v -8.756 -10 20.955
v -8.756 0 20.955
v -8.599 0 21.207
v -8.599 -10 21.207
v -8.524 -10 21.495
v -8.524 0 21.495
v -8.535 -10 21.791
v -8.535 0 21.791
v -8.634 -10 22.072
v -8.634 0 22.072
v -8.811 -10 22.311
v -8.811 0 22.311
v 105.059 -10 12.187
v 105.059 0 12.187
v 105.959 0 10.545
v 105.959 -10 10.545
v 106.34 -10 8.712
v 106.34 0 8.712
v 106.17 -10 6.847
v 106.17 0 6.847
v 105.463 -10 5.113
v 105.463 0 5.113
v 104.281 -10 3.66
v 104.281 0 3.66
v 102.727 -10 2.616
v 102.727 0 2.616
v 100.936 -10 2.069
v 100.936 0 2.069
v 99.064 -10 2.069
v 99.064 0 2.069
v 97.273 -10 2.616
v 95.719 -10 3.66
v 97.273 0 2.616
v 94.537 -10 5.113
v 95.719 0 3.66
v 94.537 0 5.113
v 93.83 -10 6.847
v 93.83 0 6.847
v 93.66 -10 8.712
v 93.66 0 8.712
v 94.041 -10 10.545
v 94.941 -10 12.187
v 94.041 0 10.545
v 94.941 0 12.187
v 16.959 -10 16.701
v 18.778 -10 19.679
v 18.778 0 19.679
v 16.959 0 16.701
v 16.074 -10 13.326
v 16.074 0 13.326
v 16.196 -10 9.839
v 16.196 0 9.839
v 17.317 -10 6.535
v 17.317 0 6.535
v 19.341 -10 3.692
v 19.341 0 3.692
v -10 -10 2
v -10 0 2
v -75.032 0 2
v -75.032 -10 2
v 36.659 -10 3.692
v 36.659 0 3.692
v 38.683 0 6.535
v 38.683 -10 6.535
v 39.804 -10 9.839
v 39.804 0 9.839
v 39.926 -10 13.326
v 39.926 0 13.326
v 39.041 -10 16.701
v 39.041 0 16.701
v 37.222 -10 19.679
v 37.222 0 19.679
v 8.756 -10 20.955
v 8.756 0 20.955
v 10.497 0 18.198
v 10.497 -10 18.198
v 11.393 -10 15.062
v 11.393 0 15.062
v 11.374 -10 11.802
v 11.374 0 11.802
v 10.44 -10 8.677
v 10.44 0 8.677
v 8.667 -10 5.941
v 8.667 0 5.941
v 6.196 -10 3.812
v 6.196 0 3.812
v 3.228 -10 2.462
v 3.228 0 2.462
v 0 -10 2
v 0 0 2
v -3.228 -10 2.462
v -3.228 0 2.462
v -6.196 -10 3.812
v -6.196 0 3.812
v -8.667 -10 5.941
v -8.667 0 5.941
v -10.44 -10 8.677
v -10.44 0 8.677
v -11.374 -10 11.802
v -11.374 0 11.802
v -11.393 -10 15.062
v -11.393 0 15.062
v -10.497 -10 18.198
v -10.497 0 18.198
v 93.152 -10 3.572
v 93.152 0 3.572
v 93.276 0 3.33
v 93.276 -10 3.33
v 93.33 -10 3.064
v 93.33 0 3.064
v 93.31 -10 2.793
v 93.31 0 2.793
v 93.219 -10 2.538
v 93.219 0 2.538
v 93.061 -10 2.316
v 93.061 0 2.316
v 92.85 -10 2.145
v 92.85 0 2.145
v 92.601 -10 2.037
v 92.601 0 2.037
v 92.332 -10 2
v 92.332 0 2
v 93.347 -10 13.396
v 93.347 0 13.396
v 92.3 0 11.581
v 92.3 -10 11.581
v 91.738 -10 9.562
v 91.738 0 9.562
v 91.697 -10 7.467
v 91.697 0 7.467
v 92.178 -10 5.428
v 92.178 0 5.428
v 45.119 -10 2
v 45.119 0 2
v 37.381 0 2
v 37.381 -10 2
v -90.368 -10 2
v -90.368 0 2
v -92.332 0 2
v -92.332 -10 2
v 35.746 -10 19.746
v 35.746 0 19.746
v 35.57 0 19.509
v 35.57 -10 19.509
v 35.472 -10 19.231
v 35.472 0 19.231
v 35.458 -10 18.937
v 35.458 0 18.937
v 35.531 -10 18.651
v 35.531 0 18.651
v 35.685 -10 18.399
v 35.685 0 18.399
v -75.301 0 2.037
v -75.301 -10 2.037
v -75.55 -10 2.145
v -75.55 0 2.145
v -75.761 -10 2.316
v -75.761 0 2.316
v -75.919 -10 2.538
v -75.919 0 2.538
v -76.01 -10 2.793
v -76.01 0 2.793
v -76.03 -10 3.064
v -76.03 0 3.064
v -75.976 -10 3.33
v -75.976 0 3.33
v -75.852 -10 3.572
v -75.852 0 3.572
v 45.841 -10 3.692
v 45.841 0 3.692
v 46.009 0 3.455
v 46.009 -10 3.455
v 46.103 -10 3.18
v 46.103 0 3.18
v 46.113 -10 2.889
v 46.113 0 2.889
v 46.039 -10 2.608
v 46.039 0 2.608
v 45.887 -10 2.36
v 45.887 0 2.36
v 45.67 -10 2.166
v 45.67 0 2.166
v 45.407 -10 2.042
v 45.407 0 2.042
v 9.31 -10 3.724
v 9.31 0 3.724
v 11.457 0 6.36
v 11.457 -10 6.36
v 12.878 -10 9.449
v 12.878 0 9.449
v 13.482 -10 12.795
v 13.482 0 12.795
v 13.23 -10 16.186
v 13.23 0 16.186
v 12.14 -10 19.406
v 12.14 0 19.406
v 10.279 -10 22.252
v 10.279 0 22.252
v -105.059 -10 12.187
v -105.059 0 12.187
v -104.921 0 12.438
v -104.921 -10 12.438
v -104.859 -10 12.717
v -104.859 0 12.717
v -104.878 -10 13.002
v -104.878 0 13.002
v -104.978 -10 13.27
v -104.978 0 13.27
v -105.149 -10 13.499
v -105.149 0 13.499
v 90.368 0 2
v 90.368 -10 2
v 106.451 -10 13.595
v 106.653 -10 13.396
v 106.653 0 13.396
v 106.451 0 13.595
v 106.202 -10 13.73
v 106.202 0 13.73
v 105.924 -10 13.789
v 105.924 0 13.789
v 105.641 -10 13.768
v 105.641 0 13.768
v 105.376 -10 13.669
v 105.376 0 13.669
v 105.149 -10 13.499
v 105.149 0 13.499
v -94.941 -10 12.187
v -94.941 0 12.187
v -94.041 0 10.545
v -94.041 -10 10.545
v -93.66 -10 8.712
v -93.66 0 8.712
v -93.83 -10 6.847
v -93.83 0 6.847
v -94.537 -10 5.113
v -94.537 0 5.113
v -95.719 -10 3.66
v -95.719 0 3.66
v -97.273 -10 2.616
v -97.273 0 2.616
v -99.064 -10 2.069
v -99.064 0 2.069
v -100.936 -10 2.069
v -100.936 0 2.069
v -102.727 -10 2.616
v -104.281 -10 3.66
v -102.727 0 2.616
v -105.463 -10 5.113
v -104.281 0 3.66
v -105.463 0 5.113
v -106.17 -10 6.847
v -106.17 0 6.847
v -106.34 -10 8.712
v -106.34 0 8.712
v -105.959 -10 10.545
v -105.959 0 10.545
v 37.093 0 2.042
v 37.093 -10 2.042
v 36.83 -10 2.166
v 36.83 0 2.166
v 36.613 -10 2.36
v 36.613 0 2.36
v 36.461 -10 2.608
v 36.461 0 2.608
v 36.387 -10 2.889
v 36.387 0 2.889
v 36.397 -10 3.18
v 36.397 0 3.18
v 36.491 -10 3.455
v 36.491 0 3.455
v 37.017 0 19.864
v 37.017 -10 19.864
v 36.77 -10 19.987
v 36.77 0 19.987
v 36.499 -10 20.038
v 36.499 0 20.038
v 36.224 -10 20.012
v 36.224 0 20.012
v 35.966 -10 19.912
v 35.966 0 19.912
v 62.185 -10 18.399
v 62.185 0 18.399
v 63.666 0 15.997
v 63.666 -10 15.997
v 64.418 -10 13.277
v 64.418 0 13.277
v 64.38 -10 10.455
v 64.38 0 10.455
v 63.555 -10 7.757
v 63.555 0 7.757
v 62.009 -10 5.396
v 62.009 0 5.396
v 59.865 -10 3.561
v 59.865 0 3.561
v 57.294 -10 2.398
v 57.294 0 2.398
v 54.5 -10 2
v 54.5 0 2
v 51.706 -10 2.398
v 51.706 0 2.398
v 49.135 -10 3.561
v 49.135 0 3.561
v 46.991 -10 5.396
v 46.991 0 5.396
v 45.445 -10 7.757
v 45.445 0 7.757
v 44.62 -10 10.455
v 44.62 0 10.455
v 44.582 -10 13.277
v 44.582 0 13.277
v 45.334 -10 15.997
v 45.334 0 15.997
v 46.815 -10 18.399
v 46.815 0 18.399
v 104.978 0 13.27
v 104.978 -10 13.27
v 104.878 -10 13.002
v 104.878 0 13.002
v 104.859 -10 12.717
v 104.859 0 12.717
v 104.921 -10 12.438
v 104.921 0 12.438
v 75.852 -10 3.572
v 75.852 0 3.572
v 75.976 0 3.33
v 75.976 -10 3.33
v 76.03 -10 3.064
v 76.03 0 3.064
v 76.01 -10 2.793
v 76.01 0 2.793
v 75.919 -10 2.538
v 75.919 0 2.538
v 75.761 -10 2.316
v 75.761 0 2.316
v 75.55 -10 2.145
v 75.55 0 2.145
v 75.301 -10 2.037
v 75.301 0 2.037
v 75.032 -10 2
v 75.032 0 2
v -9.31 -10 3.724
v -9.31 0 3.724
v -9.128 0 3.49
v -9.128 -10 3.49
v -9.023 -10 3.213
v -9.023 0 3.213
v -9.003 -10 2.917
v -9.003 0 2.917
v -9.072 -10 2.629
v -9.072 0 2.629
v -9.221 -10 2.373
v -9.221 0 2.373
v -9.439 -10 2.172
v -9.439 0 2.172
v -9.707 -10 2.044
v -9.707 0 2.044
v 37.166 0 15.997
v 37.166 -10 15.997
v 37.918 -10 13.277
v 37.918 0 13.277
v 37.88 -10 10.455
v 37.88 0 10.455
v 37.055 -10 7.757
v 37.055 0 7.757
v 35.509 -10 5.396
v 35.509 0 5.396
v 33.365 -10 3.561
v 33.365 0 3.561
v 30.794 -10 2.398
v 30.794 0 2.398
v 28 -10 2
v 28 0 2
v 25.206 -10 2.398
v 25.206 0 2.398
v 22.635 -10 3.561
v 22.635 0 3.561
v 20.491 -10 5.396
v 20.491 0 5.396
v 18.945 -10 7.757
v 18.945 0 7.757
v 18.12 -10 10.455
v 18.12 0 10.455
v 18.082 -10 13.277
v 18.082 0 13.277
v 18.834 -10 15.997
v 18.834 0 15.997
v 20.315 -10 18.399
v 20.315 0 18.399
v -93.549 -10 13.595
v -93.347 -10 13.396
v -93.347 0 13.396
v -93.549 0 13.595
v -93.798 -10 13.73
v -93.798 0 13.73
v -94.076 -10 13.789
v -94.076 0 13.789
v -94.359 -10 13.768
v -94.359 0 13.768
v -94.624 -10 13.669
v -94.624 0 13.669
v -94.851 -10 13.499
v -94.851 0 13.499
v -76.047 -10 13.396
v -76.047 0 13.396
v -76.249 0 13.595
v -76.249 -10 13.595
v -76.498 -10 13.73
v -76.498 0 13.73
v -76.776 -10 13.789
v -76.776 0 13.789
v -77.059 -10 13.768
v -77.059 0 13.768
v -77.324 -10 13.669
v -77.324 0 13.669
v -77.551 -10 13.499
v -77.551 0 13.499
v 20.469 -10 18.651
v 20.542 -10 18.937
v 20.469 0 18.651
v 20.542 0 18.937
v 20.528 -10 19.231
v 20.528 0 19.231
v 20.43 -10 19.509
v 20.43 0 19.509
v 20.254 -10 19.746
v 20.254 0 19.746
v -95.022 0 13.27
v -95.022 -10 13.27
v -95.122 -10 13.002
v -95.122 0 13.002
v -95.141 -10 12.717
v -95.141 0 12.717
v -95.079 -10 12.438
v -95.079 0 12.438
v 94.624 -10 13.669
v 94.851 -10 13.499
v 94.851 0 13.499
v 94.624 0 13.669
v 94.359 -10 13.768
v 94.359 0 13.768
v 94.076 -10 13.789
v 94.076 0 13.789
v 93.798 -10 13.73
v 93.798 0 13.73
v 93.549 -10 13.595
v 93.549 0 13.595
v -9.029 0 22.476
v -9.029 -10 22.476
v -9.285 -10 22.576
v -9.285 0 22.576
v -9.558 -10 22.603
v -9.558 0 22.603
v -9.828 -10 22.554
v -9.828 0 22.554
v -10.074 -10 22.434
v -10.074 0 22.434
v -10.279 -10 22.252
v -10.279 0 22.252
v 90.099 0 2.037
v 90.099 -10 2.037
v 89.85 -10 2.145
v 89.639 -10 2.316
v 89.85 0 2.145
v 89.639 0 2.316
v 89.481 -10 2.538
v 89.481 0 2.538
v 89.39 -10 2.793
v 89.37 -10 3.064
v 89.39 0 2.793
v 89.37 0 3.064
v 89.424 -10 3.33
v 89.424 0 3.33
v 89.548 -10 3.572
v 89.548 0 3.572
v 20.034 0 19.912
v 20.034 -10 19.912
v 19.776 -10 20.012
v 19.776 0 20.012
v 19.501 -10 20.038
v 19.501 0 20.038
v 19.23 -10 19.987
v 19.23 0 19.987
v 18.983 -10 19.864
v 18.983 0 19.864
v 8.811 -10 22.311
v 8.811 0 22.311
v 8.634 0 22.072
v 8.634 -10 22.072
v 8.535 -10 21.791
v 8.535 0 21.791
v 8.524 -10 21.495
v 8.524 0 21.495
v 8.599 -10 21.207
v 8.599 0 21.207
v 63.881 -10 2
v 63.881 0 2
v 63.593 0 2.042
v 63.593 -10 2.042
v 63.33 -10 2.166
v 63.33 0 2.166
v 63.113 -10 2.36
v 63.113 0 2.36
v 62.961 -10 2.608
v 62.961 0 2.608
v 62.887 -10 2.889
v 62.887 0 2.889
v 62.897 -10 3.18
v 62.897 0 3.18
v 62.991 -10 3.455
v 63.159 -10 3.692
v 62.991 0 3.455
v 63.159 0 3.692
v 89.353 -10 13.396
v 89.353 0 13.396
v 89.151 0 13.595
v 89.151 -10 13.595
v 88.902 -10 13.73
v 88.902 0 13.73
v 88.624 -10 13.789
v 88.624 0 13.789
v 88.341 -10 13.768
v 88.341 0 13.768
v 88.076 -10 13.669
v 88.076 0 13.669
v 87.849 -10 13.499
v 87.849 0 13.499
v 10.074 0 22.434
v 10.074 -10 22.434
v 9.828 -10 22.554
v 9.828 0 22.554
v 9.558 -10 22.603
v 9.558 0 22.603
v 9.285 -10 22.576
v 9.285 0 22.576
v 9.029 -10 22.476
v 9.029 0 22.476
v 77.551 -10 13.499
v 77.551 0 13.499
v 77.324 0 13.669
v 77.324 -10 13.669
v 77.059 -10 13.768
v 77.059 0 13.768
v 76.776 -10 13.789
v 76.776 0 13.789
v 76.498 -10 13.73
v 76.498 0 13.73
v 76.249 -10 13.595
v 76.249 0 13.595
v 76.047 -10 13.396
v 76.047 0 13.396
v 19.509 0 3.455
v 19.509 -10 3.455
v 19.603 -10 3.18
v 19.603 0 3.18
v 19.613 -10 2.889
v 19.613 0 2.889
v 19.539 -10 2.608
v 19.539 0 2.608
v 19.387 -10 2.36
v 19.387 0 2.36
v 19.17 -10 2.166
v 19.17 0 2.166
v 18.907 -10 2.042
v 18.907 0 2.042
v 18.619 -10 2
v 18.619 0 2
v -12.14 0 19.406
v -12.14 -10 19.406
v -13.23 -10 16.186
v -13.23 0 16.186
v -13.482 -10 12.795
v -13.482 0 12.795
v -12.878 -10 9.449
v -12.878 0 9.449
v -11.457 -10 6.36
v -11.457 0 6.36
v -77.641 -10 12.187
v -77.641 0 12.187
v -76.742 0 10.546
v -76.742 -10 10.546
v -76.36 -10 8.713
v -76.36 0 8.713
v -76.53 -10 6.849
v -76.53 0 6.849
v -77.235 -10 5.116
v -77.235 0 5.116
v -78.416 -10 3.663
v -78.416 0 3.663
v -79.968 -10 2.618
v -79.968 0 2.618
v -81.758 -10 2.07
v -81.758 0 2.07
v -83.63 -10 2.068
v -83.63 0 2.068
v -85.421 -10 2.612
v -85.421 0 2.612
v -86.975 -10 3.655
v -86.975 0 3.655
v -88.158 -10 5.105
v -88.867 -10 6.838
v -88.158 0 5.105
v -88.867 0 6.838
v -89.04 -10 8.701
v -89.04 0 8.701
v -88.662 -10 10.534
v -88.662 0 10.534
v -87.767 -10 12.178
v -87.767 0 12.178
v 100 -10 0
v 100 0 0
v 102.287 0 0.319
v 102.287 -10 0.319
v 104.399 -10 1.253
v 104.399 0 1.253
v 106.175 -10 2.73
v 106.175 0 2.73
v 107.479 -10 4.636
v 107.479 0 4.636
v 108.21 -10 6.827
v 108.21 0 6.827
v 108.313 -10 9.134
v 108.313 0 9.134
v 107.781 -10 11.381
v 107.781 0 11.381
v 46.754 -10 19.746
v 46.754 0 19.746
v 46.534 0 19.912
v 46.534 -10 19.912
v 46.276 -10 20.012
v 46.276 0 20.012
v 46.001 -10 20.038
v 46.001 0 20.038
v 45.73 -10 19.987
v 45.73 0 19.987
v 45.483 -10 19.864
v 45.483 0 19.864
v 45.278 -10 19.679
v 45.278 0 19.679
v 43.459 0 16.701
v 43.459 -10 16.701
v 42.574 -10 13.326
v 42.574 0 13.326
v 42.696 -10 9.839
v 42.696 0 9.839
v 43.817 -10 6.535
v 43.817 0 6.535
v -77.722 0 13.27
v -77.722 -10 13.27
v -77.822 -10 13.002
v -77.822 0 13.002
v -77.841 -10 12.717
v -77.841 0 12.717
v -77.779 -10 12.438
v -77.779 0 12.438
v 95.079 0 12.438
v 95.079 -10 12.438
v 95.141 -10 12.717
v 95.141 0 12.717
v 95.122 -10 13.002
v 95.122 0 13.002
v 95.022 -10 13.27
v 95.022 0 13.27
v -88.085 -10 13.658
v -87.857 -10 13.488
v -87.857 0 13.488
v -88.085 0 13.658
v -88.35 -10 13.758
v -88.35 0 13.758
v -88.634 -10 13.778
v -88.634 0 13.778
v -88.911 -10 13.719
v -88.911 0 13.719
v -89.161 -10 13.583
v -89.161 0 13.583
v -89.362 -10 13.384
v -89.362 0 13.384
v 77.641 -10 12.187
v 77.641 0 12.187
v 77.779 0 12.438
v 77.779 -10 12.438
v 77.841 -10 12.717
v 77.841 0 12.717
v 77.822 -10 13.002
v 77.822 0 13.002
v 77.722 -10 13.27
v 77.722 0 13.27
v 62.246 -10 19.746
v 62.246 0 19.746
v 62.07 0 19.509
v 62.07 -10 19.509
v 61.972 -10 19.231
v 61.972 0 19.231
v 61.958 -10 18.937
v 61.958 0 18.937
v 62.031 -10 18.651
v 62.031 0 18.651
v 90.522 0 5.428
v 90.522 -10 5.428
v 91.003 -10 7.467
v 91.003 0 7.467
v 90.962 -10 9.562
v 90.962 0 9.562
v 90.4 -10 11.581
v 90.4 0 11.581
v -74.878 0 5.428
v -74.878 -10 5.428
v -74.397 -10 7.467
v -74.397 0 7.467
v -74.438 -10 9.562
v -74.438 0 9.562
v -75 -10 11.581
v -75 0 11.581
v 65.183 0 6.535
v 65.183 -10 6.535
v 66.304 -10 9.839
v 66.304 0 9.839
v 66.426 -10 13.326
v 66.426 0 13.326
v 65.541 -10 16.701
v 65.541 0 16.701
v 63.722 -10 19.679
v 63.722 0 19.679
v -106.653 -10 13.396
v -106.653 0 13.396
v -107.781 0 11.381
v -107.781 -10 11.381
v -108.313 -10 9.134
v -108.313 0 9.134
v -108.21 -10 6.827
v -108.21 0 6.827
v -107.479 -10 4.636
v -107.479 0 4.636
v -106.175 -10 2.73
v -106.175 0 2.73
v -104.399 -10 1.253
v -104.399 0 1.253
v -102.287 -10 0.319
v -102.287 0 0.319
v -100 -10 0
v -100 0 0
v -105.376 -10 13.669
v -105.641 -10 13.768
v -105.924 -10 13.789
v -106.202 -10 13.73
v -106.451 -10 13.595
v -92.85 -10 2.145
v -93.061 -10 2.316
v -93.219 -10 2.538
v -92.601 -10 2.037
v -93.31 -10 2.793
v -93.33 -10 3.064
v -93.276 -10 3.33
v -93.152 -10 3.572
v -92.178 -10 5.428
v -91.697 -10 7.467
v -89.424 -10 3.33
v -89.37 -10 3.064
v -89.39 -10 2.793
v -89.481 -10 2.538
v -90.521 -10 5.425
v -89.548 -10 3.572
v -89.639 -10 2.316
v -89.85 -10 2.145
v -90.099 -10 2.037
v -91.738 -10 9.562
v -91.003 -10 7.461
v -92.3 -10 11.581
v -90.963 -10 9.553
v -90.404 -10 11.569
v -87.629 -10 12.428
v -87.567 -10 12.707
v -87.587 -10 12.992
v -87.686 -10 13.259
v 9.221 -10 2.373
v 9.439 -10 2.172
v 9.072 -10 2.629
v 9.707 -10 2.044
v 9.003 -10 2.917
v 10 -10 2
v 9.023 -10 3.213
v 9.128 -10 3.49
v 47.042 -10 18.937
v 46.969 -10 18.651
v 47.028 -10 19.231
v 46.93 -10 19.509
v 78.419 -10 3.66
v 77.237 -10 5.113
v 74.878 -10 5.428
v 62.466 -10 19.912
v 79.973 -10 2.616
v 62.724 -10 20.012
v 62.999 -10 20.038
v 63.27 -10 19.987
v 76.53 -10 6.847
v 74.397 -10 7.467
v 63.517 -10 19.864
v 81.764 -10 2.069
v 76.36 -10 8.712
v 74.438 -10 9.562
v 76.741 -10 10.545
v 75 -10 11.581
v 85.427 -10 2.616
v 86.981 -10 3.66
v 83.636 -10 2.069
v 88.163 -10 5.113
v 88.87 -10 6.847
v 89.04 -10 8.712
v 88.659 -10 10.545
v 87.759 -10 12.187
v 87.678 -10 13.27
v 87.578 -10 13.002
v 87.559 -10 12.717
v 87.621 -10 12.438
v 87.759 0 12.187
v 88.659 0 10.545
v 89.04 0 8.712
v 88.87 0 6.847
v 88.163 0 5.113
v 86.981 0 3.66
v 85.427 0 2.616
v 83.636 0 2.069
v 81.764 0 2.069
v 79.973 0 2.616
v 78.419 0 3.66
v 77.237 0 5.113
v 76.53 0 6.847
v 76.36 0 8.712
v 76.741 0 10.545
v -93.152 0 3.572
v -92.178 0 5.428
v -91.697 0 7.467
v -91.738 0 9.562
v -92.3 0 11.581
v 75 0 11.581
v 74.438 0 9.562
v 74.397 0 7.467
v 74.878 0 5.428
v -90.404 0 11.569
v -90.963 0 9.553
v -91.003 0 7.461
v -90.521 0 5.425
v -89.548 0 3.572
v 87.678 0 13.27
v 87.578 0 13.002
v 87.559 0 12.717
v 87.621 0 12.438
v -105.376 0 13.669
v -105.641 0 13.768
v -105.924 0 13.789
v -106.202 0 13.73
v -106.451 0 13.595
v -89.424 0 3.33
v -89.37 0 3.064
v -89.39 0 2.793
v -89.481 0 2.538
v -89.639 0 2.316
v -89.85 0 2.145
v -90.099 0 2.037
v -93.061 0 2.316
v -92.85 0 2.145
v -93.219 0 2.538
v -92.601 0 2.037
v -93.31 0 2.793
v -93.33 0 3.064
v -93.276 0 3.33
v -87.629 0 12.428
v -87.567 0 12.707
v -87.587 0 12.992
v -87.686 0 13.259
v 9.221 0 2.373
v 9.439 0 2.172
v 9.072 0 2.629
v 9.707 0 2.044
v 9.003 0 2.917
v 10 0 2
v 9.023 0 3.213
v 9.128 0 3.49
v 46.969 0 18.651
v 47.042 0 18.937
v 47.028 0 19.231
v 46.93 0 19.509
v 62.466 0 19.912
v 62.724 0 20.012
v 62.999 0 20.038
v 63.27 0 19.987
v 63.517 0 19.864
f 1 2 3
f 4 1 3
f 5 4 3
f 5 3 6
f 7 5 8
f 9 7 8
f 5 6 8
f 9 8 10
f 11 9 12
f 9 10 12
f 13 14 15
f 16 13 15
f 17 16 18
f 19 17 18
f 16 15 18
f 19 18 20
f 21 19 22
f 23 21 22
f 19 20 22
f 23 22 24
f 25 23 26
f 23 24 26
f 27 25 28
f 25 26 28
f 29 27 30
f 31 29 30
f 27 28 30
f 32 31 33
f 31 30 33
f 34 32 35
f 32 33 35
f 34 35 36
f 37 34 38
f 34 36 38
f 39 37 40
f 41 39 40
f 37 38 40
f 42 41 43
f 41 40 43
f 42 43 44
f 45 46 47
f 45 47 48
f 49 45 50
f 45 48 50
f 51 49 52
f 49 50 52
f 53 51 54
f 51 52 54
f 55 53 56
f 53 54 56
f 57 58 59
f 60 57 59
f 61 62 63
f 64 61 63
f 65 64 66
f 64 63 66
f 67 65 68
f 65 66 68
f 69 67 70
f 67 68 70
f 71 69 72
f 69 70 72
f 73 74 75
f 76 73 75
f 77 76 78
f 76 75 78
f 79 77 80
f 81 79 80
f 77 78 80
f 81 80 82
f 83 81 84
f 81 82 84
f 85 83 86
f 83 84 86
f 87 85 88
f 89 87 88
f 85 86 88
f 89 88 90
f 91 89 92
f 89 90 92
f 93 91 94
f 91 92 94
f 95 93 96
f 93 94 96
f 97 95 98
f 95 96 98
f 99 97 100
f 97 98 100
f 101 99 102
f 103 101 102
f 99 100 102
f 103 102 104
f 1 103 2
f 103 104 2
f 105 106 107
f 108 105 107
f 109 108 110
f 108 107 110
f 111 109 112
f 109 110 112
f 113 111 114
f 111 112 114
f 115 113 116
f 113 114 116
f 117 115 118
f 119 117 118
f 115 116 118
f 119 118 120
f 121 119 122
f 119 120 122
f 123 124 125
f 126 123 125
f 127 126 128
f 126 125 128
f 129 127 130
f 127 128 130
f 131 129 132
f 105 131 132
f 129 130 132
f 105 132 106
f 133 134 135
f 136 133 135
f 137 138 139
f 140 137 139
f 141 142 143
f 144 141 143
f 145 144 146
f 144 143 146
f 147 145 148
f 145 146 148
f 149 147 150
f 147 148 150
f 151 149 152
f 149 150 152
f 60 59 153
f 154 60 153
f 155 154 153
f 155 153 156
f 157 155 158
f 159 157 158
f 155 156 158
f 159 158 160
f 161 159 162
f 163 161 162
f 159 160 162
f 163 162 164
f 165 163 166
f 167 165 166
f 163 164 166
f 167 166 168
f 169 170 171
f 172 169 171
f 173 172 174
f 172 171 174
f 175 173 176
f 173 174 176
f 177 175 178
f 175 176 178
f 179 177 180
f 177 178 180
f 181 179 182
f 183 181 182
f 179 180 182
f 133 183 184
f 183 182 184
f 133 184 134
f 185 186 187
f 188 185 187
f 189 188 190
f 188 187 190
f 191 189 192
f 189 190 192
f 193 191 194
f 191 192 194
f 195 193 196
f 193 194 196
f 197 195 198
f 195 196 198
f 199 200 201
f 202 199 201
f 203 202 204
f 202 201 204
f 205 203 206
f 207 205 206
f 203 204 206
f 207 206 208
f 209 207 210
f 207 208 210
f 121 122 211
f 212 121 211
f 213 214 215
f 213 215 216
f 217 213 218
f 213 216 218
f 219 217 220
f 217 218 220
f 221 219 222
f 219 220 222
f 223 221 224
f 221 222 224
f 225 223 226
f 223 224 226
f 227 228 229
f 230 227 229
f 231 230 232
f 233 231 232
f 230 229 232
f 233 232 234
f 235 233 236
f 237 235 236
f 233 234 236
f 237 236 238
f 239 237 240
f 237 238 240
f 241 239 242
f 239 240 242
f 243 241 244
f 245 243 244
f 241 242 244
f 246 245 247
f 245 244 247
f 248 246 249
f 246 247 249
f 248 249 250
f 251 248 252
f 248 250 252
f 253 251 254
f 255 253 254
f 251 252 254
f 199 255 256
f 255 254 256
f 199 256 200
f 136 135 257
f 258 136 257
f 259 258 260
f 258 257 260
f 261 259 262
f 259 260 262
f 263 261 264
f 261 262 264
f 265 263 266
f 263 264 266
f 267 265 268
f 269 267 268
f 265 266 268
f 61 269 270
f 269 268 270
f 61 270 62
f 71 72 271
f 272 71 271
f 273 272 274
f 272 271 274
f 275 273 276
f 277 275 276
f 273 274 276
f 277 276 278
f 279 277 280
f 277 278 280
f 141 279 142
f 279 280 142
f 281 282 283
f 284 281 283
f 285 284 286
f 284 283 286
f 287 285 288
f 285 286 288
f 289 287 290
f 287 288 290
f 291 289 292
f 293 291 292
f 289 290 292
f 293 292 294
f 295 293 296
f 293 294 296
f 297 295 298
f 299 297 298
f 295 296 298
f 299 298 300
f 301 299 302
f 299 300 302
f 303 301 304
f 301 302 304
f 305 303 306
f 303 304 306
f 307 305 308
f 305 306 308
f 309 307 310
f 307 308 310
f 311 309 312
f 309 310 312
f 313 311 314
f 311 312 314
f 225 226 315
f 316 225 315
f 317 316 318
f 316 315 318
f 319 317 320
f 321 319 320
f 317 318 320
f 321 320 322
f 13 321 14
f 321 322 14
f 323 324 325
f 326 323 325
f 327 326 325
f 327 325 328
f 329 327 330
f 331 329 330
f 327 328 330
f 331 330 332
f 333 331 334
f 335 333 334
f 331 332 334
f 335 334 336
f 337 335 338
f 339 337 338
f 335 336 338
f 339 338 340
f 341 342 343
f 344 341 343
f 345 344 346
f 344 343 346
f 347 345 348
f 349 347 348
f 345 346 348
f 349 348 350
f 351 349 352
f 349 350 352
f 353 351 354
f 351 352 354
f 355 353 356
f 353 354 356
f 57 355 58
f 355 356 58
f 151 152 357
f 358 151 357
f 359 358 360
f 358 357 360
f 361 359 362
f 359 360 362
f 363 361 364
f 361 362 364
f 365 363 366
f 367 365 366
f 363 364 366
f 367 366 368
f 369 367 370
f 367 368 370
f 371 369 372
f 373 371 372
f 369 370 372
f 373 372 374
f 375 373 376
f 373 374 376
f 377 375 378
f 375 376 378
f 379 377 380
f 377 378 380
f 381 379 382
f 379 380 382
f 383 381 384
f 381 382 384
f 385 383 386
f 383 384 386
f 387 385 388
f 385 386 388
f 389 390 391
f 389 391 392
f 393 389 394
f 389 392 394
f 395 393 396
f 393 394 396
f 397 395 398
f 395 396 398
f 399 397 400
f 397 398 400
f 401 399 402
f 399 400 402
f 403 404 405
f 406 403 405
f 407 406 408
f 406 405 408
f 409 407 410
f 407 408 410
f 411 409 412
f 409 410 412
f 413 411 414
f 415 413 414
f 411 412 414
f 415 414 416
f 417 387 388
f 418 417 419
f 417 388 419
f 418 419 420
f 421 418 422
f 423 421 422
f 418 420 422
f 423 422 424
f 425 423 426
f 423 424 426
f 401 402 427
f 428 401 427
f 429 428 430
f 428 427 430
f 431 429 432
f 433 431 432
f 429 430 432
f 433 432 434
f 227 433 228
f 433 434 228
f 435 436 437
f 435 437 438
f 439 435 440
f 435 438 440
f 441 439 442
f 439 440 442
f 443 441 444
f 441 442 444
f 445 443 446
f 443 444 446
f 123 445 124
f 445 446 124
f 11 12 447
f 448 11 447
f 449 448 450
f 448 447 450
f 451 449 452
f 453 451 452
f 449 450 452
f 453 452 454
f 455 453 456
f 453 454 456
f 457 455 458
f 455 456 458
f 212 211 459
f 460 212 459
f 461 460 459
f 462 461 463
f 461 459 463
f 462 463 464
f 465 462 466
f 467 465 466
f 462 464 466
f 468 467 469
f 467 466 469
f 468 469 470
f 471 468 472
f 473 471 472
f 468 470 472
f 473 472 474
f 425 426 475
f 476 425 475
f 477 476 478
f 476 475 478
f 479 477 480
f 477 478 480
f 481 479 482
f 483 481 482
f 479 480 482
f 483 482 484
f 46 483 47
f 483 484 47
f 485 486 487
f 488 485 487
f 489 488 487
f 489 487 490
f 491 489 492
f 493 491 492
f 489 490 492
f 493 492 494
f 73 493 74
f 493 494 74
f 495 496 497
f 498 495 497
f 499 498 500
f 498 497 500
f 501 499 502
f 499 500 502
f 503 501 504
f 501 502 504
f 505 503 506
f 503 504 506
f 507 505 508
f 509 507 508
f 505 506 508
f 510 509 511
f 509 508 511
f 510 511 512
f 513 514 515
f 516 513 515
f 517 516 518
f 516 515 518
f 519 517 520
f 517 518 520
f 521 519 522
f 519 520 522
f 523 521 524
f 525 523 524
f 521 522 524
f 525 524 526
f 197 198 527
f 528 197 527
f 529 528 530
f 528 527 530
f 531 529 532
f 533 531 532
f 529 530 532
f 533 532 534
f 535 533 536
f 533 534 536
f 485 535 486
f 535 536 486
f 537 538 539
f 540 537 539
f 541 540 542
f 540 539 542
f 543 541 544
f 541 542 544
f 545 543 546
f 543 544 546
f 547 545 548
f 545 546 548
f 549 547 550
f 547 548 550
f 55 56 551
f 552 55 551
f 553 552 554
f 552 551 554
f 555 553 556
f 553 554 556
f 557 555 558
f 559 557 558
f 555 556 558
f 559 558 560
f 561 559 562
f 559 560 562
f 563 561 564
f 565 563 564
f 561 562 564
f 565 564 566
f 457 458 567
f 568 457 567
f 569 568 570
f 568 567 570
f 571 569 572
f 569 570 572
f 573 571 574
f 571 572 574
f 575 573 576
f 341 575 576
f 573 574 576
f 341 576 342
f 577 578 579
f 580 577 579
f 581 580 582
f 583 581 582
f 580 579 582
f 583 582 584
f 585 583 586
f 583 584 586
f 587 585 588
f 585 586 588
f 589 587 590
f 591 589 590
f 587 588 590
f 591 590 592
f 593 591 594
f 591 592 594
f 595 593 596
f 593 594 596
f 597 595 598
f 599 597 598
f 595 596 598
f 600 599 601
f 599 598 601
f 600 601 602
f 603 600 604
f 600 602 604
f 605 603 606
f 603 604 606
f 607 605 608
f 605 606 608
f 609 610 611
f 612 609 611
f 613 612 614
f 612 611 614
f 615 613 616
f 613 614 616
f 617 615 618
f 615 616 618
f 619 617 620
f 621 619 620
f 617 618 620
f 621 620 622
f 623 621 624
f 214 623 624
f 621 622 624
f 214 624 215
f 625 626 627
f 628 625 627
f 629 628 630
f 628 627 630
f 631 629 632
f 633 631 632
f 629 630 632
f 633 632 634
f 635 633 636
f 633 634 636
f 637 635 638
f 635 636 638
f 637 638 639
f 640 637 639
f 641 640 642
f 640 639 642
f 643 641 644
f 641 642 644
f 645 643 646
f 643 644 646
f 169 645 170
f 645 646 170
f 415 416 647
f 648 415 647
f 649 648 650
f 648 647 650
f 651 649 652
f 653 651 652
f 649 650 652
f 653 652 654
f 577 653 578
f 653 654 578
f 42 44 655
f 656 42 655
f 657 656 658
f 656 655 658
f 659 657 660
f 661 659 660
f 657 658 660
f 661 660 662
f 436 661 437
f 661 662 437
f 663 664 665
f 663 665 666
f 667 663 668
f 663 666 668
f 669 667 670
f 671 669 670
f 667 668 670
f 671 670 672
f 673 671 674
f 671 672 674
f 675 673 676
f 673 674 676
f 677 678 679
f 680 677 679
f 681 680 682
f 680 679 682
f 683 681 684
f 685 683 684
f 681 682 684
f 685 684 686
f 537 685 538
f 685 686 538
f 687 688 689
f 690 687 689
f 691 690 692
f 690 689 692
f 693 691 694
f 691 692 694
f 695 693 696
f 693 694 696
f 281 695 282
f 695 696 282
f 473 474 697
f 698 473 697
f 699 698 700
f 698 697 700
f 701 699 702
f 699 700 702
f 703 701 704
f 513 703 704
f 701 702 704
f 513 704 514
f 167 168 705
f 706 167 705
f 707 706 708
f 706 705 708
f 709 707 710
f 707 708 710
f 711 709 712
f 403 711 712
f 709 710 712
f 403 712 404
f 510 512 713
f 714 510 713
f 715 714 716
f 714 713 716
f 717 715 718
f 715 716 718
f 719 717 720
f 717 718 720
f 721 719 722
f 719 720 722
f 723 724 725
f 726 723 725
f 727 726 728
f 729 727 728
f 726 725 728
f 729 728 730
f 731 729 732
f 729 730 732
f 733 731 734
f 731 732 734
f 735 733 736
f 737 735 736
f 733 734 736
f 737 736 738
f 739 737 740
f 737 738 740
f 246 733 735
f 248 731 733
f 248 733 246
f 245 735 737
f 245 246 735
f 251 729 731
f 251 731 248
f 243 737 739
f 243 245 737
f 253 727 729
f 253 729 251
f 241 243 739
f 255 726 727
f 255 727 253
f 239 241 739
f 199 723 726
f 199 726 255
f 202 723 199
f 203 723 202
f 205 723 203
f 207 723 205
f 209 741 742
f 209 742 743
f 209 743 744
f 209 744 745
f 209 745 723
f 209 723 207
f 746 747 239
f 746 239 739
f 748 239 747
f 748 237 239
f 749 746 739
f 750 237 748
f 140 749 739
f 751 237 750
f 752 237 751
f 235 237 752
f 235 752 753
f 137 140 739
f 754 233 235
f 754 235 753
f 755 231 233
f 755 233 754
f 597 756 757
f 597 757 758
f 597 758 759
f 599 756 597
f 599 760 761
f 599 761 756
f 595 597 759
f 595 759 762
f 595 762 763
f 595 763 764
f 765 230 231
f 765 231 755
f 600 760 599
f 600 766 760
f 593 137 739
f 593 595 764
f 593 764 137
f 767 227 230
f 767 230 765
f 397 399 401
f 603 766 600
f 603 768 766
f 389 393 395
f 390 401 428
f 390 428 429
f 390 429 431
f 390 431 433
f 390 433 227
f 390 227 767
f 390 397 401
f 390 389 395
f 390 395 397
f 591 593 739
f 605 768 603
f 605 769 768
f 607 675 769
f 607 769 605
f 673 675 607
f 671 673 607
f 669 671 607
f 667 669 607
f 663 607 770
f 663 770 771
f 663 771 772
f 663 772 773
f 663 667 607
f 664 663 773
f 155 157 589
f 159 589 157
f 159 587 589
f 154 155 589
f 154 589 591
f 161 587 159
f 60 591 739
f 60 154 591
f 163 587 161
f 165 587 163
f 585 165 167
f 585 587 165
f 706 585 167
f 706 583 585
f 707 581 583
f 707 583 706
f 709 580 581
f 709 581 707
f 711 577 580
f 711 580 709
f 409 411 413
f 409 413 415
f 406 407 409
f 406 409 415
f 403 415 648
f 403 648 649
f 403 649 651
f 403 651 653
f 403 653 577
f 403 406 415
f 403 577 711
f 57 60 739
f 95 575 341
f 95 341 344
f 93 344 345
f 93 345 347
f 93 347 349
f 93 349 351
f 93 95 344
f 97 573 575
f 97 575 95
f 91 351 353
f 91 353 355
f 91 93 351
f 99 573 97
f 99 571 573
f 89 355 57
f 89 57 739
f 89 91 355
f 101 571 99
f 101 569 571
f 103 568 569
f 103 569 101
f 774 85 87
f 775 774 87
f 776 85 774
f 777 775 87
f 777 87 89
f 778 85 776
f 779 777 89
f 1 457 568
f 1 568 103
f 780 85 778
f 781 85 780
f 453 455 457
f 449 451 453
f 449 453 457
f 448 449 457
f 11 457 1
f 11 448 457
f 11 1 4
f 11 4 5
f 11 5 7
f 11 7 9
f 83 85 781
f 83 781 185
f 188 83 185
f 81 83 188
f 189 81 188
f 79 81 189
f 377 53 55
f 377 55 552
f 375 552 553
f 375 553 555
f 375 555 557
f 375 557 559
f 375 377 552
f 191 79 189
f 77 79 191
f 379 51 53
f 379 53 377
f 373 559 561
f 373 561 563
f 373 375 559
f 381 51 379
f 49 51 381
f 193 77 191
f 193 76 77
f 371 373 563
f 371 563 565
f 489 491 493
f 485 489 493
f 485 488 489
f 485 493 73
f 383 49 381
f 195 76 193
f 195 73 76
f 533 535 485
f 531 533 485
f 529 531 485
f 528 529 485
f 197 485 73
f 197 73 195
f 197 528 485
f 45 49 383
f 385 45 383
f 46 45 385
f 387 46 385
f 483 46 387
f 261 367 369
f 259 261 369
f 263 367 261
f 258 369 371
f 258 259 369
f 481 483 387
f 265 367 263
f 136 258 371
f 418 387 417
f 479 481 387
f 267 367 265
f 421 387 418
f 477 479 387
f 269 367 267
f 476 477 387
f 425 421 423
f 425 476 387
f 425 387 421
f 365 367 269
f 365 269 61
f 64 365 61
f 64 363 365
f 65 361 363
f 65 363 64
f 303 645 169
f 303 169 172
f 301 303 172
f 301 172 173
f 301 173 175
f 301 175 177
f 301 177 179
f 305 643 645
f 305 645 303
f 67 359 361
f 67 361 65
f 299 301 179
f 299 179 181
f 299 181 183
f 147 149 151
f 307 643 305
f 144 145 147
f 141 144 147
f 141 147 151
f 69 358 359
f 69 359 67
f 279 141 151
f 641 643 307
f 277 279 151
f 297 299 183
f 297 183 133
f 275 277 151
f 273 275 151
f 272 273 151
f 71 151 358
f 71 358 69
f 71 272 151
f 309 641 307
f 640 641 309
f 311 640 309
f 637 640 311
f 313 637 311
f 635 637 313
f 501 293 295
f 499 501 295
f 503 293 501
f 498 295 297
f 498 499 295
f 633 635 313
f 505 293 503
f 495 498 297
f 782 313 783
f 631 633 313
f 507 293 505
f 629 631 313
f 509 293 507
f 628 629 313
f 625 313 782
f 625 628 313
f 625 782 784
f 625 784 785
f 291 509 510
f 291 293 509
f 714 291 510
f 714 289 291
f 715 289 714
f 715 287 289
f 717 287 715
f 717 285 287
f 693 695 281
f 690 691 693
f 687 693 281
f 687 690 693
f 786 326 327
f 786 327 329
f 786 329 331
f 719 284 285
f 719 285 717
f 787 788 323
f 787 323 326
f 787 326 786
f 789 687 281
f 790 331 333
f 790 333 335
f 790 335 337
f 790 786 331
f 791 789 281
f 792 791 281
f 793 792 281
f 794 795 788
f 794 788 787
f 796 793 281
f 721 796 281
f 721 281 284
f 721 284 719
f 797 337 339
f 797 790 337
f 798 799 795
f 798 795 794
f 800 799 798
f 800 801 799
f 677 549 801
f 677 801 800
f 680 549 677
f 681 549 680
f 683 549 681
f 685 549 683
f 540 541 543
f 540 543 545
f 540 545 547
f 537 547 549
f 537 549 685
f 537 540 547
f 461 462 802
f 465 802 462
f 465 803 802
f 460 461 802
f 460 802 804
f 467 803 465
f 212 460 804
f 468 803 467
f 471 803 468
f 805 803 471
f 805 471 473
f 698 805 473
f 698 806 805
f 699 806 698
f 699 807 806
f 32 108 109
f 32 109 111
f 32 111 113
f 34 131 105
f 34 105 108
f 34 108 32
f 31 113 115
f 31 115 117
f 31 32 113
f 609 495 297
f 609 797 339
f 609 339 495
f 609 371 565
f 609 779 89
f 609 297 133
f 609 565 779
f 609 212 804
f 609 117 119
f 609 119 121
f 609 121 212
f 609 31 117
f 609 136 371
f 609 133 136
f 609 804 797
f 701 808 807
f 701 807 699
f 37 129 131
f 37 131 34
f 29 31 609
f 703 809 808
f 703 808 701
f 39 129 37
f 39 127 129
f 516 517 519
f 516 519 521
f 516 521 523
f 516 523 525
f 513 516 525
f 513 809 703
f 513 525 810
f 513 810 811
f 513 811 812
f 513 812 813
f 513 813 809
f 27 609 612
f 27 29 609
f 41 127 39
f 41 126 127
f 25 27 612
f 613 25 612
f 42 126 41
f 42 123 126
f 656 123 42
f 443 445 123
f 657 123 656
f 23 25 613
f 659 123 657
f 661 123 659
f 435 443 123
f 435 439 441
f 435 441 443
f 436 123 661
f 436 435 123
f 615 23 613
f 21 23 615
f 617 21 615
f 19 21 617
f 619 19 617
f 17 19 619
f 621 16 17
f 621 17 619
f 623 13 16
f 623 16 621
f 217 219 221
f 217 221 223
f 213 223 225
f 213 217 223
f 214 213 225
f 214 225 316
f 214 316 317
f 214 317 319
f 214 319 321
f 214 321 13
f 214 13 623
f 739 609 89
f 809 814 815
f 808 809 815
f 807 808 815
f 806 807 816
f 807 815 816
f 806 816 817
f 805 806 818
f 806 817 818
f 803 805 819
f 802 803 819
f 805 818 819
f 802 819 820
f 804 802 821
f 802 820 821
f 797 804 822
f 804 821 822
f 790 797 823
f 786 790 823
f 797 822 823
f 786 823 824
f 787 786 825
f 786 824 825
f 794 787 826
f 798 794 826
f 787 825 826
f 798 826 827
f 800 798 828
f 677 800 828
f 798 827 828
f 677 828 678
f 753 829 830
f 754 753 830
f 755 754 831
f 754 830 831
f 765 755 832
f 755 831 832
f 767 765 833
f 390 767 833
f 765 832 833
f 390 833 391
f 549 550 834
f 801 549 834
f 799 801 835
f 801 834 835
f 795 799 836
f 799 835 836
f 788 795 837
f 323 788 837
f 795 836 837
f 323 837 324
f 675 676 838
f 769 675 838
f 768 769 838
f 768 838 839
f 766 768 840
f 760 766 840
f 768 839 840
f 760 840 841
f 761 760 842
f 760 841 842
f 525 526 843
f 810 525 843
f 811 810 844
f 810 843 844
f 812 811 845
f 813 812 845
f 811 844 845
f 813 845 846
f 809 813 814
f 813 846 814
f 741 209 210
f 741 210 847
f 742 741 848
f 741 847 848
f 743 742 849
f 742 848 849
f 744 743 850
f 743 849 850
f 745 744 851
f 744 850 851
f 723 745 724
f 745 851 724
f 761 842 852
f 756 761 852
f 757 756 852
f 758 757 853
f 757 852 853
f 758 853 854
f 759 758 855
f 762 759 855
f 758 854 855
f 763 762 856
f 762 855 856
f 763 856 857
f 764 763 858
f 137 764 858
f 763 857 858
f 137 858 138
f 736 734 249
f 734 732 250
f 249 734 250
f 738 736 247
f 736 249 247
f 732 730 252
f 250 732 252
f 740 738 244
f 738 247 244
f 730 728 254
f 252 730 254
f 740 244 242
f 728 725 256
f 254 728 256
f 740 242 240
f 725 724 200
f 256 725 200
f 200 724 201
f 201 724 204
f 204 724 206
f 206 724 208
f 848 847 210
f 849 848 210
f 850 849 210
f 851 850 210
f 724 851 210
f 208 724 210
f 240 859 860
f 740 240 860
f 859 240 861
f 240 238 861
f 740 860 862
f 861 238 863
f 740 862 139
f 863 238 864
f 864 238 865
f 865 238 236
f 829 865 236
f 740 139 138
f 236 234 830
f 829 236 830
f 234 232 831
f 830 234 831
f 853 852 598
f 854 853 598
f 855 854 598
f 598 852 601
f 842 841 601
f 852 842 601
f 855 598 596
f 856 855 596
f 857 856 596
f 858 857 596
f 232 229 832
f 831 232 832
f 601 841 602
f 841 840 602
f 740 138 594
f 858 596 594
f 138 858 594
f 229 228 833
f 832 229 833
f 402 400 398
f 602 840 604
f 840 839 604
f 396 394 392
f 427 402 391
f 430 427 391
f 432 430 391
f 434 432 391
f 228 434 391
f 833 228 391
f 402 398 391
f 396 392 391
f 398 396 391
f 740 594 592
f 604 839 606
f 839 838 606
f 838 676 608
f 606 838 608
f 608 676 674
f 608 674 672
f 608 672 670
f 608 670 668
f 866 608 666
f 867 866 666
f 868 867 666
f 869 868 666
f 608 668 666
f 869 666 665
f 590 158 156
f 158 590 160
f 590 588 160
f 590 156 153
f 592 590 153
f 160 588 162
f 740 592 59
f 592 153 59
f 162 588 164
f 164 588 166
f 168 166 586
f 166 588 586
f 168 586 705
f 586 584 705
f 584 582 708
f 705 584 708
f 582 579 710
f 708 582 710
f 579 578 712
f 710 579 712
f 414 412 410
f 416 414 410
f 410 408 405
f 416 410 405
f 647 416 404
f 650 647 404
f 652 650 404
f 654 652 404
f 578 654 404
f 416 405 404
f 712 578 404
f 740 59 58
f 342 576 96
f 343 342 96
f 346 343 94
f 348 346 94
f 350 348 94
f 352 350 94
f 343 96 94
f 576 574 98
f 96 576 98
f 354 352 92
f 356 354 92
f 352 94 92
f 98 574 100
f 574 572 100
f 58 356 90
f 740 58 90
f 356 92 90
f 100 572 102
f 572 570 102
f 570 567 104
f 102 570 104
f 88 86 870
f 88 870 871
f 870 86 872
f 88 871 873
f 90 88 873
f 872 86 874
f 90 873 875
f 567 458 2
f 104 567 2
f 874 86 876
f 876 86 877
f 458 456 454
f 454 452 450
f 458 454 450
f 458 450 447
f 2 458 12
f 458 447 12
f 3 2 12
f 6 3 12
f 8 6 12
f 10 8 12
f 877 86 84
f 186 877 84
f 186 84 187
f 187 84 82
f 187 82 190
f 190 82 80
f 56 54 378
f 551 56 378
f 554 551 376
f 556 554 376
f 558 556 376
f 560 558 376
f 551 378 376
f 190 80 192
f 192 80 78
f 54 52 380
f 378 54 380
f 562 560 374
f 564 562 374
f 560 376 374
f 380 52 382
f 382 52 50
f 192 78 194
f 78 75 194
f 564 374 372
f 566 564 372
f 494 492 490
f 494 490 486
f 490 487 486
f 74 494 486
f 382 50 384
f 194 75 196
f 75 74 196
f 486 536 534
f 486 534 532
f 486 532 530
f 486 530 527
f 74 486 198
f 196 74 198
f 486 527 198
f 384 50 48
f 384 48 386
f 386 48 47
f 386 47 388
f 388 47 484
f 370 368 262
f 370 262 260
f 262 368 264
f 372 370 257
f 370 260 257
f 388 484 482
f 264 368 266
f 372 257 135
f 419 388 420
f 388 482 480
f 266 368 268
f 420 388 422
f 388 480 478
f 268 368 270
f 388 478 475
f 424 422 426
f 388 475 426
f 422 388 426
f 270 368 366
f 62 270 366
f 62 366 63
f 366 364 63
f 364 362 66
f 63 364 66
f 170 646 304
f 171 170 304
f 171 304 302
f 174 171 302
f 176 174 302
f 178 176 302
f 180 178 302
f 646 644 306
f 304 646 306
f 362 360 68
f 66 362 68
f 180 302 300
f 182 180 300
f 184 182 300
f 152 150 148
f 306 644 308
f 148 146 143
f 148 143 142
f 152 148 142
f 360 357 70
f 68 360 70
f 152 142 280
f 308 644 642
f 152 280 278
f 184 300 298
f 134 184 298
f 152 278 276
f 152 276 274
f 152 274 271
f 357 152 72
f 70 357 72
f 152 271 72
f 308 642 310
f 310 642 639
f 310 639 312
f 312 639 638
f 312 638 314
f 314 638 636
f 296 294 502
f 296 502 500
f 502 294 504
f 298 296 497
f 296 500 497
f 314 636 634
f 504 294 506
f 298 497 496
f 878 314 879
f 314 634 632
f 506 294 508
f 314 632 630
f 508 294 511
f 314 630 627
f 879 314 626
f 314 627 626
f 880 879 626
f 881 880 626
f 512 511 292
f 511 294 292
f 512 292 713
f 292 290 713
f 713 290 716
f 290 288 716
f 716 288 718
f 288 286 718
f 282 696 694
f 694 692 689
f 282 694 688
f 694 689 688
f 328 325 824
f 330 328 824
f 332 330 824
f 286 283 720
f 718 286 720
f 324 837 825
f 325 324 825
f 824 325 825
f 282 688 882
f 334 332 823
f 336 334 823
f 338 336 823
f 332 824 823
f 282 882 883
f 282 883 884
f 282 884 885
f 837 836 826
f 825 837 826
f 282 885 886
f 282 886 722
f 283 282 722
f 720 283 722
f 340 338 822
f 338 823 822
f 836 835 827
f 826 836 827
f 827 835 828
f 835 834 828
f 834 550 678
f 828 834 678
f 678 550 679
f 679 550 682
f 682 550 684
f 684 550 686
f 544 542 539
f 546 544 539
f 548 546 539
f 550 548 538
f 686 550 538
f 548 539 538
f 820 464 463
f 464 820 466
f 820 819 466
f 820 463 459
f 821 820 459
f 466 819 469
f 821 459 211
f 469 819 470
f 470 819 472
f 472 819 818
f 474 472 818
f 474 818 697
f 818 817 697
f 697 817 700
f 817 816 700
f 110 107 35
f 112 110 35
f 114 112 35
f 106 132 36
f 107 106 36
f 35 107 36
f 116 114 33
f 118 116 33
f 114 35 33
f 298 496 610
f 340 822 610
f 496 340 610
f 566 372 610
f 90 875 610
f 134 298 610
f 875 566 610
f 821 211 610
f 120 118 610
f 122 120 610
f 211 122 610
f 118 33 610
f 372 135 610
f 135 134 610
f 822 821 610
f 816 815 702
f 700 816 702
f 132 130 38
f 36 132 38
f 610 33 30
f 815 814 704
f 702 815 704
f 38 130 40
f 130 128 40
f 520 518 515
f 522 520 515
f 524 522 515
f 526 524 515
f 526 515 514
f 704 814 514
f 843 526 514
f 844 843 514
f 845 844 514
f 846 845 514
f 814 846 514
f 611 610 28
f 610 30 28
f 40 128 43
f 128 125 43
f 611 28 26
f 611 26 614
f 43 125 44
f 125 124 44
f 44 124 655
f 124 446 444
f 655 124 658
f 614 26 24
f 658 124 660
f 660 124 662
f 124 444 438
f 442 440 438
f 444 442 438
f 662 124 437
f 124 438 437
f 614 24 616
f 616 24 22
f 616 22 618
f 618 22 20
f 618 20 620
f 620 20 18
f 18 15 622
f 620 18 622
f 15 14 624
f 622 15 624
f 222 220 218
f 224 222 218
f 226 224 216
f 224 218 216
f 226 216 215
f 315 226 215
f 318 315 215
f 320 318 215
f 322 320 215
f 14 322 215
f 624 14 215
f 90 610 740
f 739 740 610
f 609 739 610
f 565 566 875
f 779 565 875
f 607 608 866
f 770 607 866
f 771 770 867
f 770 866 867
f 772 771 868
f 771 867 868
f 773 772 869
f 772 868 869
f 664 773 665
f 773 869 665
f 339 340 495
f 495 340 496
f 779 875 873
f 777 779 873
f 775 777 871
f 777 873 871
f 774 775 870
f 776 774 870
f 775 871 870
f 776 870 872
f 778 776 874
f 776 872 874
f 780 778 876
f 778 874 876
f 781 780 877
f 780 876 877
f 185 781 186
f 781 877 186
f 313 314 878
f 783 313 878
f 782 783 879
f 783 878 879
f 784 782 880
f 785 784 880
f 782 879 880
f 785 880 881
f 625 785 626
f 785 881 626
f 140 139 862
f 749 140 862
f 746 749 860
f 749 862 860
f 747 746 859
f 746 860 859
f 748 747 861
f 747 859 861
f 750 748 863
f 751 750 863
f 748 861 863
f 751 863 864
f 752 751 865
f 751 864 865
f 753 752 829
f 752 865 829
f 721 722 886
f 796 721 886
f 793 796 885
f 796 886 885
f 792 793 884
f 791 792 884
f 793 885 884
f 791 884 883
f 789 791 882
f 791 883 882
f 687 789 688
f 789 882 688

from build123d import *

# Parameters (mm, degrees)
F1_DEPTH = 10


with BuildPart() as f1:
    # F0 (on Front) → F1 (new body)
    with BuildSketch(Plane.XZ):
        with BuildLine():
            Line((-100, 0), (0, 0))
            Line((0, 0), (100, 0))
            ThreePointArc((100, 0), (107.478558, 4.636017), (106.652751, 13.396128))
            ThreePointArc((106.652751, 13.396128), (105.9242, 13.789474), (105.148908, 13.498908))
            ThreePointArc((105.148908, 13.498908), (104.858342, 12.859987), (105.059278, 12.187474))
            ThreePointArc((105.059278, 12.187474), (100, 2), (94.940722, 12.187474))
            ThreePointArc((94.940722, 12.187474), (95.141658, 12.859987), (94.851092, 13.498908))
            ThreePointArc((94.851092, 13.498908), (94.0758, 13.789474), (93.347249, 13.396128))
            ThreePointArc((93.347249, 13.396128), (91.651649, 8.515919), (93.152004, 3.572193))
            ThreePointArc((93.152004, 3.572193), (93.218505, 2.537503), (92.331884, 2))
            Line((92.331884, 2), (90.368116, 2))
            ThreePointArc((90.368116, 2), (89.481495, 2.537503), (89.547996, 3.572193))
            ThreePointArc((89.547996, 3.572193), (91.048351, 8.515919), (89.352751, 13.396128))
            ThreePointArc((89.352751, 13.396128), (88.6242, 13.789474), (87.848908, 13.498908))
            ThreePointArc((87.848908, 13.498908), (87.558342, 12.859987), (87.759278, 12.187474))
            ThreePointArc((87.759278, 12.187474), (82.7, 2), (77.640722, 12.187474))
            ThreePointArc((77.640722, 12.187474), (77.841658, 12.859987), (77.551092, 13.498908))
            ThreePointArc((77.551092, 13.498908), (76.7758, 13.789474), (76.047249, 13.396128))
            ThreePointArc((76.047249, 13.396128), (74.351649, 8.515919), (75.852004, 3.572193))
            ThreePointArc((75.852004, 3.572193), (75.918505, 2.537503), (75.031884, 2))
            Line((75.031884, 2), (63.880832, 2))
            ThreePointArc((63.880832, 2), (62.960965, 2.607768), (63.159229, 3.692308))
            ThreePointArc((63.159229, 3.692308), (66.492584, 11.578174), (63.721535, 19.678756))
            ThreePointArc((63.721535, 19.678756), (62.998575, 20.037824), (62.245967, 19.745967))
            ThreePointArc((62.245967, 19.745967), (61.954109, 19.084362), (62.184612, 18.398964))
            ThreePointArc((62.184612, 18.398964), (54.5, 2), (46.815388, 18.398964))
            ThreePointArc((46.815388, 18.398964), (47.045891, 19.084362), (46.754033, 19.745967))
            ThreePointArc((46.754033, 19.745967), (46.001425, 20.037824), (45.278465, 19.678756))
            ThreePointArc((45.278465, 19.678756), (42.507416, 11.578174), (45.840771, 3.692308))
            ThreePointArc((45.840771, 3.692308), (46.039035, 2.607768), (45.119168, 2))
            Line((45.119168, 2), (37.380832, 2))
            ThreePointArc((37.380832, 2), (36.460965, 2.607768), (36.659229, 3.692308))
            ThreePointArc((36.659229, 3.692308), (39.992584, 11.578174), (37.221535, 19.678756))
            ThreePointArc((37.221535, 19.678756), (36.498575, 20.037824), (35.745967, 19.745967))
            ThreePointArc((35.745967, 19.745967), (35.454109, 19.084362), (35.684612, 18.398964))
            ThreePointArc((35.684612, 18.398964), (28, 2), (20.315388, 18.398964))
            ThreePointArc((20.315388, 18.398964), (20.545891, 19.084362), (20.254033, 19.745967))
            ThreePointArc((20.254033, 19.745967), (19.501425, 20.037824), (18.778465, 19.678756))
            ThreePointArc((18.778465, 19.678756), (16.007416, 11.578174), (19.340771, 3.692308))
            ThreePointArc((19.340771, 3.692308), (19.539035, 2.607768), (18.619168, 2))
            Line((18.619168, 2), (10, 2))
            ThreePointArc((10, 2), (9.071523, 2.628609), (9.310345, 3.724138))
            ThreePointArc((9.310345, 3.724138), (13.481586, 12.795141), (10.279021, 22.25167))
            ThreePointArc((10.279021, 22.25167), (9.557644, 22.602597), (8.810505, 22.310505))
            ThreePointArc((8.810505, 22.310505), (8.518413, 21.64343), (8.756203, 20.955126))
            ThreePointArc((8.756203, 20.955126), (0, 2), (-8.756203, 20.955126))
            ThreePointArc((-8.756203, 20.955126), (-8.518413, 21.64343), (-8.810505, 22.310505))
            ThreePointArc((-8.810505, 22.310505), (-9.557644, 22.602597), (-10.279021, 22.25167))
            ThreePointArc((-10.279021, 22.25167), (-13.481586, 12.795141), (-9.310345, 3.724138))
            ThreePointArc((-9.310345, 3.724138), (-9.071523, 2.628609), (-10, 2))
            Line((-10, 2), (-75.031884, 2))
            ThreePointArc((-75.031884, 2), (-75.918505, 2.537503), (-75.852004, 3.572193))
            ThreePointArc((-75.852004, 3.572193), (-74.351649, 8.515919), (-76.047249, 13.396128))
            ThreePointArc((-76.047249, 13.396128), (-76.7758, 13.789474), (-77.551092, 13.498908))
            ThreePointArc((-77.551092, 13.498908), (-77.841658, 12.859987), (-77.640722, 12.187474))
            ThreePointArc((-77.640722, 12.187474), (-82.693985, 2.000003), (-87.766539, 12.177883))
            ThreePointArc((-87.766539, 12.177883), (-87.566811, 12.84983), (-87.857312, 13.487806))
            ThreePointArc((-87.857312, 13.487806), (-88.63355, 13.778306), (-89.362299, 13.383515))
            ThreePointArc((-89.362299, 13.383515), (-91.048505, 8.508011), (-89.547996, 3.572193))
            ThreePointArc((-89.547996, 3.572193), (-89.481495, 2.537503), (-90.368116, 2))
            Line((-90.368116, 2), (-92.331884, 2))
            ThreePointArc((-92.331884, 2), (-93.218505, 2.537503), (-93.152004, 3.572193))
            ThreePointArc((-93.152004, 3.572193), (-91.651649, 8.515919), (-93.347249, 13.396128))
            ThreePointArc((-93.347249, 13.396128), (-94.0758, 13.789474), (-94.851092, 13.498908))
            ThreePointArc((-94.851092, 13.498908), (-95.141658, 12.859987), (-94.940722, 12.187474))
            ThreePointArc((-94.940722, 12.187474), (-100, 2), (-105.059278, 12.187474))
            ThreePointArc((-105.059278, 12.187474), (-104.858342, 12.859987), (-105.148908, 13.498908))
            ThreePointArc((-105.148908, 13.498908), (-105.9242, 13.789474), (-106.652751, 13.396128))
            ThreePointArc((-106.652751, 13.396128), (-107.478558, 4.636017), (-100, 0))
        make_face()
    extrude(amount=F1_DEPTH)


solid = f1.part
